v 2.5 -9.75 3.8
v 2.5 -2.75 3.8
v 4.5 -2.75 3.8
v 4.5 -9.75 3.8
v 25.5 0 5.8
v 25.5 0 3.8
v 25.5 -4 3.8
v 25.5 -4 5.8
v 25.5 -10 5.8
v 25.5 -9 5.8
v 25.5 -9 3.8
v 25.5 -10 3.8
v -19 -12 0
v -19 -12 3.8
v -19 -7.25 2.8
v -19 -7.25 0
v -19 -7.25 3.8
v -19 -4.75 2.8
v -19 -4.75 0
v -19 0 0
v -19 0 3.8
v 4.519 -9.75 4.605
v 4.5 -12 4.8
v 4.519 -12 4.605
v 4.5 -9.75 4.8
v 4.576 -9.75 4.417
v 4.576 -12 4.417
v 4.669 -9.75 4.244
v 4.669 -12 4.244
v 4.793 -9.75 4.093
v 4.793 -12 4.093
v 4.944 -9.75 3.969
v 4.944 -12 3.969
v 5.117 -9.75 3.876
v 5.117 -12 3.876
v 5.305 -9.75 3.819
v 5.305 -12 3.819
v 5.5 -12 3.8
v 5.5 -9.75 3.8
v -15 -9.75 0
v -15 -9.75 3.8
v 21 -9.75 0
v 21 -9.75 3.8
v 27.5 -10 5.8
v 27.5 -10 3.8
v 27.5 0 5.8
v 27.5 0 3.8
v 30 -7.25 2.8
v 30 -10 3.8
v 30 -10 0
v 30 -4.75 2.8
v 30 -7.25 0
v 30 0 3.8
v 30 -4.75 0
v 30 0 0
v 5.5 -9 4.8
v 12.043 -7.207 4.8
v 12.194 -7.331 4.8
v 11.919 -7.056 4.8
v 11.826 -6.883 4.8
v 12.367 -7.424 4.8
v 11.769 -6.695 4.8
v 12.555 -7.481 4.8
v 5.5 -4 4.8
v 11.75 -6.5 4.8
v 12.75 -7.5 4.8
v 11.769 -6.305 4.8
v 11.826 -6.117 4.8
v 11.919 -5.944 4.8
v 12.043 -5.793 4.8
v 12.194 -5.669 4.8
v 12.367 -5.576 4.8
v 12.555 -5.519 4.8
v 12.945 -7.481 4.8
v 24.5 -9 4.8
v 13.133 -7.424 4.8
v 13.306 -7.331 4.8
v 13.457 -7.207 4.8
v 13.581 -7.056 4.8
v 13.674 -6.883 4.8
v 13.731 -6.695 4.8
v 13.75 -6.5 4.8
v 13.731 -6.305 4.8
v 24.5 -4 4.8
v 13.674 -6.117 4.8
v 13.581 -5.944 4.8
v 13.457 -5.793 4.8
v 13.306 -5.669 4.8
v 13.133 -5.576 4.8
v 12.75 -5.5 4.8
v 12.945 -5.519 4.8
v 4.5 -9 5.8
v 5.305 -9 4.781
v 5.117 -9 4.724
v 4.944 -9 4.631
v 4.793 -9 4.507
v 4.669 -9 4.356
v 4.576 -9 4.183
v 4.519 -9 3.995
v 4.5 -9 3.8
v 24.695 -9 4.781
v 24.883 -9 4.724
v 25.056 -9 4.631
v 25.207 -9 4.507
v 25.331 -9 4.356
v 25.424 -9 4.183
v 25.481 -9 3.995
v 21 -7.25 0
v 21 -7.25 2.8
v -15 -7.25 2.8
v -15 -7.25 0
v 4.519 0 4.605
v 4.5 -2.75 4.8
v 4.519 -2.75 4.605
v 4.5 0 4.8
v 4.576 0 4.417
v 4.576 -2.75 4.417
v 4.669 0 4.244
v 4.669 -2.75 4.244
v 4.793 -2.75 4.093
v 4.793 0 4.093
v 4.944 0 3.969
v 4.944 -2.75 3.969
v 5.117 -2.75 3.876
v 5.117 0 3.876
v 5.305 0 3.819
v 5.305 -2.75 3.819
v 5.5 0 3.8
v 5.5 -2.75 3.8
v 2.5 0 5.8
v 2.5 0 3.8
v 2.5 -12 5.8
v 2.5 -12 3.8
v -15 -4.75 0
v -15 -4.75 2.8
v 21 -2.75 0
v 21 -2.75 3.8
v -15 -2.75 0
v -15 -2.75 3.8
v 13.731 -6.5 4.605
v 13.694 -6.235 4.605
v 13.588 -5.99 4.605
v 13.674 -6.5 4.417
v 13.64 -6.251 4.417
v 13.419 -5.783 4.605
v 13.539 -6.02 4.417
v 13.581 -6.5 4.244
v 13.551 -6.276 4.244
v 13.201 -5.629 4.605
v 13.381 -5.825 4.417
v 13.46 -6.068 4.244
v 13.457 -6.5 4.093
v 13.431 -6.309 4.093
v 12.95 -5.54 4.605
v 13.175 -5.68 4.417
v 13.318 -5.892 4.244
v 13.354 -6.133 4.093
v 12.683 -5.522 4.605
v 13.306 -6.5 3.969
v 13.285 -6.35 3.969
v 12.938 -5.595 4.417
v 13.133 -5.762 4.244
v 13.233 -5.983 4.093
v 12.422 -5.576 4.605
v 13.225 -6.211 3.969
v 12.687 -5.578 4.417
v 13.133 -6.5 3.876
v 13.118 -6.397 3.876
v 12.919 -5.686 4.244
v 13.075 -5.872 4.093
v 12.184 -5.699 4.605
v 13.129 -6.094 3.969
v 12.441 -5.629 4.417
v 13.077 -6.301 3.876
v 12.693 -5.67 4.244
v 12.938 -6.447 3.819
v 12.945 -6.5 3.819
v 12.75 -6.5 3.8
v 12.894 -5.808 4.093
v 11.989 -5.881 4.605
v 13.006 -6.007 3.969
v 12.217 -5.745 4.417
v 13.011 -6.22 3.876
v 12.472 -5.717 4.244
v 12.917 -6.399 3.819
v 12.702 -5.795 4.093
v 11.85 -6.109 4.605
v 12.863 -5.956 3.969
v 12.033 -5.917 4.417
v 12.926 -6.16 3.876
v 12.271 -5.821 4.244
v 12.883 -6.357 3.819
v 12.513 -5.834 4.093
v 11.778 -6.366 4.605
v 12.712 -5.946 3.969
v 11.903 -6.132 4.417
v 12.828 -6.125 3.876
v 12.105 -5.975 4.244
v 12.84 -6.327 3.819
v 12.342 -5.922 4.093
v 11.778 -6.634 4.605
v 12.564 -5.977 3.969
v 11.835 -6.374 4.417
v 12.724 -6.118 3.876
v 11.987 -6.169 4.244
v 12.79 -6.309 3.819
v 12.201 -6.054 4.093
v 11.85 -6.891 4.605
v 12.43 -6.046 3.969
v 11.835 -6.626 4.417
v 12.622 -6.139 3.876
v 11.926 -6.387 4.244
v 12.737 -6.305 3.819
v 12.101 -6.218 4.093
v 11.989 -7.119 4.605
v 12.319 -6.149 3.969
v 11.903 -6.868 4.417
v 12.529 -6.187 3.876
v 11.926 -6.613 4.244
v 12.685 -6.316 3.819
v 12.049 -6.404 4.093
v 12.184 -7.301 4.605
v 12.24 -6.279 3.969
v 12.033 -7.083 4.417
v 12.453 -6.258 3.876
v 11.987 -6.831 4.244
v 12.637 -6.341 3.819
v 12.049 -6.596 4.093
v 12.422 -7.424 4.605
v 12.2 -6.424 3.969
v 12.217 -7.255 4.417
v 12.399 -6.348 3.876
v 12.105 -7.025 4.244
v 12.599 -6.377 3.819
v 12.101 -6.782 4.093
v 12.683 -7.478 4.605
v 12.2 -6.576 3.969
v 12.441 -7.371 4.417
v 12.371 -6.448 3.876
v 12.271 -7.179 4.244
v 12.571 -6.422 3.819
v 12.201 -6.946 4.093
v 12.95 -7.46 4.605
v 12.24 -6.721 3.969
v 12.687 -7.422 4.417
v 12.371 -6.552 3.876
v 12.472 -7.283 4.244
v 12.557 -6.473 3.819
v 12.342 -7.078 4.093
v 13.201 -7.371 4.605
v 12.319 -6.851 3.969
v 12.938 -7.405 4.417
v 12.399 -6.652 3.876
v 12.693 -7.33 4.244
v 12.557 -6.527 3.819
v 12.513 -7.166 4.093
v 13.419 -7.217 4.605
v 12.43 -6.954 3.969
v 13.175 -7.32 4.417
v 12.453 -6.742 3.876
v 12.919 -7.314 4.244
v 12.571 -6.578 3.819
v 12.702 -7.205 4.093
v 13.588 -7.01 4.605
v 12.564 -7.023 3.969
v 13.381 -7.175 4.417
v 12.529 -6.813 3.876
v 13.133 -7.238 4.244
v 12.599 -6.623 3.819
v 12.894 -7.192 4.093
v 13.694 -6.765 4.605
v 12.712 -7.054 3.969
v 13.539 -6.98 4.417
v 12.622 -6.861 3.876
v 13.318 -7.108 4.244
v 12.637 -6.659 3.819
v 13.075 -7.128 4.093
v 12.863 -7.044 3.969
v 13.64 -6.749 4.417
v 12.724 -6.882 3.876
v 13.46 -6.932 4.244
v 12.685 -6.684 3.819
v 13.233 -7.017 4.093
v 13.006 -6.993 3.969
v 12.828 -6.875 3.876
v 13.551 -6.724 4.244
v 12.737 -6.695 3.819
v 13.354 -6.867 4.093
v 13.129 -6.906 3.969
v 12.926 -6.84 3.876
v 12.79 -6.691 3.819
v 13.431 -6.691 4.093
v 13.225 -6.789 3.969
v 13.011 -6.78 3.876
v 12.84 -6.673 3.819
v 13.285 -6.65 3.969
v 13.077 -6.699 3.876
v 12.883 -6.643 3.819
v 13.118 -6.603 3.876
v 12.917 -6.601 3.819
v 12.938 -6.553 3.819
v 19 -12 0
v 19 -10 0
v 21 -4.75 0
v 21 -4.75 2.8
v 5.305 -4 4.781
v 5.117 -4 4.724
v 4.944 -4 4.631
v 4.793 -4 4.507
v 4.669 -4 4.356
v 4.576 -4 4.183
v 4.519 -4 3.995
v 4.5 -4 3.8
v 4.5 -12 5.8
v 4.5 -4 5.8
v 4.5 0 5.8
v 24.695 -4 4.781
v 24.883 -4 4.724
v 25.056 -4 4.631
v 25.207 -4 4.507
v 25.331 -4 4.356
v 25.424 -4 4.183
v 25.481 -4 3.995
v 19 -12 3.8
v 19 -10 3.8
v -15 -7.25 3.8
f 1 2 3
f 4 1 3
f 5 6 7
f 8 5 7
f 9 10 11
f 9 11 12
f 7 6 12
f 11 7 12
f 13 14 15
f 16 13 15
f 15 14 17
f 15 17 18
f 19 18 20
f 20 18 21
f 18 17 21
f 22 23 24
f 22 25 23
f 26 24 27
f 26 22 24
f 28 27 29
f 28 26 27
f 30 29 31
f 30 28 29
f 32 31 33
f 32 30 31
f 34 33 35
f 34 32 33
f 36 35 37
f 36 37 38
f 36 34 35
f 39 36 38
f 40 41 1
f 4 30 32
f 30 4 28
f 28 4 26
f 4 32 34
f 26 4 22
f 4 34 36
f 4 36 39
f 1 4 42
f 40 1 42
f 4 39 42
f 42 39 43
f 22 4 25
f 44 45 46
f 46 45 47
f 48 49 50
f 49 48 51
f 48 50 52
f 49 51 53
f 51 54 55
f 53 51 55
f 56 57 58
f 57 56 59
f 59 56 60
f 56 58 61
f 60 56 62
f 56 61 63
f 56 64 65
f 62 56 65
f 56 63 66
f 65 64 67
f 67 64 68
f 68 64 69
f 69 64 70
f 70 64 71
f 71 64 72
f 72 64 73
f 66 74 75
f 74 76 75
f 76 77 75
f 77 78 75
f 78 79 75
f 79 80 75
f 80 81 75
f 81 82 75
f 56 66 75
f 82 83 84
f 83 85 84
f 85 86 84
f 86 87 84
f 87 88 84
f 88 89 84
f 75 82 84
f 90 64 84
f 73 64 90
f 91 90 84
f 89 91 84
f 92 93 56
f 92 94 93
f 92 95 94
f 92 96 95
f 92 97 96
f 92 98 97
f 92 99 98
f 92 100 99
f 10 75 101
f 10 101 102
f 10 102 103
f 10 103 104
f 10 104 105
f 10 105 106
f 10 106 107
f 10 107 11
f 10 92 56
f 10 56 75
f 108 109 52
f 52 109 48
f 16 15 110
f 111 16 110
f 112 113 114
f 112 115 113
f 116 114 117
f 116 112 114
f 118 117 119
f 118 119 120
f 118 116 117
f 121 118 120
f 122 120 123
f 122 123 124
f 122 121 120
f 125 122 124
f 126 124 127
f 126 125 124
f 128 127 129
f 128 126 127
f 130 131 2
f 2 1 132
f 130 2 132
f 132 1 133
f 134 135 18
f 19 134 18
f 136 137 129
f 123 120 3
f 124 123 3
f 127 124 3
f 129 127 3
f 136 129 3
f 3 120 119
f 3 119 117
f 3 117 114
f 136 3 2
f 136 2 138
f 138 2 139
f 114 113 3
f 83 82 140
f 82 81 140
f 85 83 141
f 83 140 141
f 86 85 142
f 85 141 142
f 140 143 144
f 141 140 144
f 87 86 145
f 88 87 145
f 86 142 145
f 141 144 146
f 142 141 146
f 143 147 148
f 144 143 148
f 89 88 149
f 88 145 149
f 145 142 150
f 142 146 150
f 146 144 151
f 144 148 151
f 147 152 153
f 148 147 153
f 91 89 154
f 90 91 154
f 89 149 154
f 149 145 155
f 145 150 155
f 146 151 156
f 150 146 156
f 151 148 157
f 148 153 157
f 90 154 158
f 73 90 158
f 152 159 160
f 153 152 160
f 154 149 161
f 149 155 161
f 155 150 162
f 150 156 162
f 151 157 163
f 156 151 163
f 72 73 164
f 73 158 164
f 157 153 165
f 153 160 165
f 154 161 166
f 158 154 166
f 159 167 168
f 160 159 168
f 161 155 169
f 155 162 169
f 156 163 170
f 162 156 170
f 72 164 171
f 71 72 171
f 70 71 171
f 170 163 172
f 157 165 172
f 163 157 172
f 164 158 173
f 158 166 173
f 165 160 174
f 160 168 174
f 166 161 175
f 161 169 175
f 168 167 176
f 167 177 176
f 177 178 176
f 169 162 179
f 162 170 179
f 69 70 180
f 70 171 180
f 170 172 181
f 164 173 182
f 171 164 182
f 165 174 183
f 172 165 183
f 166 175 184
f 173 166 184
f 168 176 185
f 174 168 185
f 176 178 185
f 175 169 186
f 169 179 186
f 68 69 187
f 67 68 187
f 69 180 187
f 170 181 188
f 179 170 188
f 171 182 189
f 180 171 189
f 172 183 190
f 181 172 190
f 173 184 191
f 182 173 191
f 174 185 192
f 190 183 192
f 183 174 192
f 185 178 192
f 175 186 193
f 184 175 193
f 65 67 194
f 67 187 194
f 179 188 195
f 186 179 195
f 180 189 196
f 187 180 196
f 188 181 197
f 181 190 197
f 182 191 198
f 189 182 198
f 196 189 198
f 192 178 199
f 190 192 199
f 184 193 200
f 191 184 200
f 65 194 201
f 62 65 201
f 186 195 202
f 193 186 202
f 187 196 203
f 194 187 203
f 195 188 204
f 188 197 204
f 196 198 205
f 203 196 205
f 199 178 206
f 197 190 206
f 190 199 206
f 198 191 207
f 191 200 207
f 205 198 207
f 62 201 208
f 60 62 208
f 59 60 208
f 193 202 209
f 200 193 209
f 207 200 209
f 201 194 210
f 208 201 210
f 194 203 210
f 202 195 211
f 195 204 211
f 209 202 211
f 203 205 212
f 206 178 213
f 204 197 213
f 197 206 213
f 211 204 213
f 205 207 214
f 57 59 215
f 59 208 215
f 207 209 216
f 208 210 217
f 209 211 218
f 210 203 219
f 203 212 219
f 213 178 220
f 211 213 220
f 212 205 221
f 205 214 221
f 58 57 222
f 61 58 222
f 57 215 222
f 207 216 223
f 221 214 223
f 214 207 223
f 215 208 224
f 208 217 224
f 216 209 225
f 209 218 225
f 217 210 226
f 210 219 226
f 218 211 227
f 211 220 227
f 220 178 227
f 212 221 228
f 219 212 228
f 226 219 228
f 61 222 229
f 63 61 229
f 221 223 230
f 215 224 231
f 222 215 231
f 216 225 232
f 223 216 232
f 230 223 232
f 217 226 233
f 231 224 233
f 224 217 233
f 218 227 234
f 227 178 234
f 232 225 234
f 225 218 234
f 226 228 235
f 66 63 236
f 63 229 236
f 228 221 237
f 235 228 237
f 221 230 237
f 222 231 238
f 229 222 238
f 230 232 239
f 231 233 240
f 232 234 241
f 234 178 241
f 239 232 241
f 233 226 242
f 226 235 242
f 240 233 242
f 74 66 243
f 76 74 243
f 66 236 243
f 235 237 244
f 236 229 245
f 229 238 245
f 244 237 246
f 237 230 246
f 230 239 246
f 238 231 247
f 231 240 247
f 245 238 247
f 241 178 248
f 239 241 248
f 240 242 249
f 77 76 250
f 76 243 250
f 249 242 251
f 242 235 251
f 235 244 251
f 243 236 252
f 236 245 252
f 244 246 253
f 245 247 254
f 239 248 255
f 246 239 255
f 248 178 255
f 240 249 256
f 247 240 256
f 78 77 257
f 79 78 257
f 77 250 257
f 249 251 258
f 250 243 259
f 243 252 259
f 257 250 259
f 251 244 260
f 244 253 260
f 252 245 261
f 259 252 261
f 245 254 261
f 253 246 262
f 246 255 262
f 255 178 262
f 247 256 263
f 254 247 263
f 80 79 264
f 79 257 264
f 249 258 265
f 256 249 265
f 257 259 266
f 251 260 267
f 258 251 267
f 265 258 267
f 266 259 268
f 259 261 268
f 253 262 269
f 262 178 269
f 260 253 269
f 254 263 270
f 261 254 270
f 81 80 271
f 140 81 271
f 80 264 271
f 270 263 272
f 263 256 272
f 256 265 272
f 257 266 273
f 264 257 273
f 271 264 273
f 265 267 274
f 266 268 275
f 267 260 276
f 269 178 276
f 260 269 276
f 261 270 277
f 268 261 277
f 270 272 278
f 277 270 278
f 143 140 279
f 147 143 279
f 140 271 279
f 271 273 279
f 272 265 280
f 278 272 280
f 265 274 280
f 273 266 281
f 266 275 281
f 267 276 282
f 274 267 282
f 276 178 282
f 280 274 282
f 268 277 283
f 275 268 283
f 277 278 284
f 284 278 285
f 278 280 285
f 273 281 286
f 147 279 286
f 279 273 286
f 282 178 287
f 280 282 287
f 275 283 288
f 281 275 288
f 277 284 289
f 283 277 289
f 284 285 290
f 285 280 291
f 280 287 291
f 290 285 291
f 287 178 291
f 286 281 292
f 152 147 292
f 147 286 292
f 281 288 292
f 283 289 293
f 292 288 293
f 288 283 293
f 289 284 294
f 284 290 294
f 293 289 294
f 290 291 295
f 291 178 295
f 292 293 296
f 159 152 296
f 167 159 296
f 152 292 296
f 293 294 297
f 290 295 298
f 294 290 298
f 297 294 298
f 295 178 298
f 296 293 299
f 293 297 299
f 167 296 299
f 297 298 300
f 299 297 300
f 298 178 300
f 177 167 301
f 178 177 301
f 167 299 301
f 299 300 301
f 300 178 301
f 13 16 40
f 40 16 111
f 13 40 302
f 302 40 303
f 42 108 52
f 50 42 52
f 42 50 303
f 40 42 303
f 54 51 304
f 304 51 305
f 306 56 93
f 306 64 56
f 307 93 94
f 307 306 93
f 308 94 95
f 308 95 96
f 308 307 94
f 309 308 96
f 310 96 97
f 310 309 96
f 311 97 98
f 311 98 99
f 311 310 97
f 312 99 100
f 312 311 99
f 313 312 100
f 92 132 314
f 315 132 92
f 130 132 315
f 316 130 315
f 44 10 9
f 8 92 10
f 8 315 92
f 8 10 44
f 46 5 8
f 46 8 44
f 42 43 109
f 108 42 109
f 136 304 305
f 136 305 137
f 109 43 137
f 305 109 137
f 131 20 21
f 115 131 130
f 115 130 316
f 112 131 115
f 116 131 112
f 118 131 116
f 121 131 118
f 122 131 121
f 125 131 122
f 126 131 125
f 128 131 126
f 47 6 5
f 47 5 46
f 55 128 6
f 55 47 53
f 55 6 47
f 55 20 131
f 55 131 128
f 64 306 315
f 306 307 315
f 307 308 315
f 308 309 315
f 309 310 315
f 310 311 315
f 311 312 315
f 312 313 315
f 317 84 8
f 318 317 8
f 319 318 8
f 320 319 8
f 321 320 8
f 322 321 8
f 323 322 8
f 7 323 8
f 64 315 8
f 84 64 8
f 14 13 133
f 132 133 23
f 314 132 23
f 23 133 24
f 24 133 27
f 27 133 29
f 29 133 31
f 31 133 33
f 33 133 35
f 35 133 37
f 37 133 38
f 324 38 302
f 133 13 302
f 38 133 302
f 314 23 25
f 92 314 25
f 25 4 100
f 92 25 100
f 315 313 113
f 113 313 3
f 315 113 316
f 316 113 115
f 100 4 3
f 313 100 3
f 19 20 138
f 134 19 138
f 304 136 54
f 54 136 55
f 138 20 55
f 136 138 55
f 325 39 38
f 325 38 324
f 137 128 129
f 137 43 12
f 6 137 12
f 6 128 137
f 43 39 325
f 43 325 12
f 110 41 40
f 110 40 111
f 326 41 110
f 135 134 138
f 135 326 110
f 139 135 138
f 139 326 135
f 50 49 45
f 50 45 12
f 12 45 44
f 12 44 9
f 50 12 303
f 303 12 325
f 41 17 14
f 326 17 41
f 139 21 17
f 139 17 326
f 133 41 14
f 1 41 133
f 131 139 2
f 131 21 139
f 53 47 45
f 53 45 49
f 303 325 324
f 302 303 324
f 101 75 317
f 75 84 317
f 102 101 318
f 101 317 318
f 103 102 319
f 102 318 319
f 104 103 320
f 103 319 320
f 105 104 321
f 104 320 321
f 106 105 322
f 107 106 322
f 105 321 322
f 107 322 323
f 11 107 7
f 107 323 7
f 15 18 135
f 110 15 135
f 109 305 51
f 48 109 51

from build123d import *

# Parameters (mm, degrees)
F0_W     = 30
F0_H     = 12
F0_W_2   = 19
F1_DEPTH = 3.8
F2_W     = 1.9557817429
F2_H     = 2.5
F2_W_2   = 17.5
F2_H_2   = 2
F2_W_3   = 2
F2_W_4   = 16.5
F2_W_5   = 4.5
F2_W_6   = 2.5
F2_W_7   = 2.0442182571
F3_DEPTH = 25
F4_DEPTH = 1
F2_H_3   = 2.75
F2_H_4   = 2.25
F2_H_5   = 4.75
F2_H_6   = 0.25
F5_DEPTH = 2
F6_W     = 21
F6_H     = 5
F6_R     = 1
F7_DEPTH = 1
F8_DEPTH = 2
F9_R     = 0.99999


# Not quite as in the source:
# - a fillet or chamfer is up to 0.001 mm smaller than in the source, because OpenCascade refuses the exact size


with BuildPart() as f1:
    # F0 (on Top) → F1 (new body)
    with BuildSketch(Plane.XY):
        with Locations((15, -6)):
            Rectangle(F0_W, F0_H)
        with Locations((-9.5, -6)):
            Rectangle(F0_W_2, F0_H)
    extrude(amount=F1_DEPTH)

    # F2 (on face) → F3 (cut)
    with BuildSketch(Plane.XY.offset(3.8)):
        with Locations((-18.0221091285, -6)):
            Rectangle(F2_W, F2_H)
        with Locations((-6.25, -3.75)):
            Rectangle(F2_W_2, F2_H_2)
        with Locations((-6.25, -6)):
            Rectangle(F2_W_2, F2_H)
        with Locations((-6.25, -8.5)):
            Rectangle(F2_W_2, F2_H)
        with Locations((3.5, -3.75)):
            Rectangle(F2_W_3, F2_H_2)
        with Locations((3.5, -6)):
            Rectangle(F2_W_3, F2_H)
        with Locations((3.5, -8.5)):
            Rectangle(F2_W_3, F2_H)
        with Locations((12.75, -8.5)):
            Rectangle(F2_W_4, F2_H)
        with Locations((12.75, -6)):
            Rectangle(F2_W_4, F2_H)
        with Locations((12.75, -3.75)):
            Rectangle(F2_W_4, F2_H_2)
        with Locations((23.25, -6)):
            Rectangle(F2_W_5, F2_H)
        with Locations((26.5, -6)):
            Rectangle(F2_W_3, F2_H)
        with Locations((28.75, -6)):
            Rectangle(F2_W_6, F2_H)
        Polygon((19, -12), (30, -12), (30, -10), (27.5, -10), (25.5, -10), (19, -10), align=None)
        with Locations((-16.0221091285, -6)):
            Rectangle(F2_W_7, F2_H)
    extrude(amount=-F3_DEPTH, mode=Mode.SUBTRACT)

    # F2 (on face) → F4 (join)
    with BuildSketch(Plane.XY.offset(3.8)):
        with Locations((-18.0221091285, -6)):
            Rectangle(F2_W, F2_H)
        with Locations((23.25, -6)):
            Rectangle(F2_W_5, F2_H)
        with Locations((26.5, -6)):
            Rectangle(F2_W_3, F2_H)
        with Locations((28.75, -6)):
            Rectangle(F2_W_6, F2_H)
        with Locations((-16.0221091285, -6)):
            Rectangle(F2_W_7, F2_H)
    extrude(amount=-F4_DEPTH)

    # F2 (on face) → F5 (join)
    with BuildSketch(Plane.XY.offset(3.8)):
        with Locations((3.5, -1.375)):
            Rectangle(F2_W_3, F2_H_3)
        with Locations((3.5, -3.75)):
            Rectangle(F2_W_3, F2_H_2)
        with Locations((3.5, -6)):
            Rectangle(F2_W_3, F2_H)
        with Locations((3.5, -8.5)):
            Rectangle(F2_W_3, F2_H)
        with Locations((3.5, -10.875)):
            Rectangle(F2_W_3, F2_H_4)
        with Locations((26.5, -2.375)):
            Rectangle(F2_W_3, F2_H_5)
        with Locations((26.5, -6)):
            Rectangle(F2_W_3, F2_H)
        with Locations((26.5, -8.5)):
            Rectangle(F2_W_3, F2_H)
        with Locations((26.5, -9.875)):
            Rectangle(F2_W_3, F2_H_6)
    extrude(amount=F5_DEPTH)

    # F6 (on face) → F7 (join)
    with BuildSketch(Plane.XY.offset(5.8)):
        with Locations((15, -6.5)):
            Rectangle(F6_W, F6_H)
        with Locations((12.75, -6.5)):
            Circle(F6_R, mode=Mode.SUBTRACT)
    extrude(amount=-F7_DEPTH)

    # F6 (on face) → F8 (join)
    with BuildSketch(Plane.XY.offset(5.8)):
        with Locations((12.75, -6.5)):
            Circle(F6_R)
    extrude(amount=-F8_DEPTH)

    # F9 (radius 1 in the source; OpenCascade refuses exactly that, so slightly less here)
    f9_edges = [f1.edges().sort_by_distance(p)[0] for p in [
        (11.75, -6.5, 3.8),
        (25.5, -6.5, 4.8),
        (4.5, -6.5, 4.8),
        (4.5, -10.875, 3.8),
        (4.5, -1.375, 3.8),
    ]]
    fillet(f9_edges, radius=F9_R)


solid = f1.part
